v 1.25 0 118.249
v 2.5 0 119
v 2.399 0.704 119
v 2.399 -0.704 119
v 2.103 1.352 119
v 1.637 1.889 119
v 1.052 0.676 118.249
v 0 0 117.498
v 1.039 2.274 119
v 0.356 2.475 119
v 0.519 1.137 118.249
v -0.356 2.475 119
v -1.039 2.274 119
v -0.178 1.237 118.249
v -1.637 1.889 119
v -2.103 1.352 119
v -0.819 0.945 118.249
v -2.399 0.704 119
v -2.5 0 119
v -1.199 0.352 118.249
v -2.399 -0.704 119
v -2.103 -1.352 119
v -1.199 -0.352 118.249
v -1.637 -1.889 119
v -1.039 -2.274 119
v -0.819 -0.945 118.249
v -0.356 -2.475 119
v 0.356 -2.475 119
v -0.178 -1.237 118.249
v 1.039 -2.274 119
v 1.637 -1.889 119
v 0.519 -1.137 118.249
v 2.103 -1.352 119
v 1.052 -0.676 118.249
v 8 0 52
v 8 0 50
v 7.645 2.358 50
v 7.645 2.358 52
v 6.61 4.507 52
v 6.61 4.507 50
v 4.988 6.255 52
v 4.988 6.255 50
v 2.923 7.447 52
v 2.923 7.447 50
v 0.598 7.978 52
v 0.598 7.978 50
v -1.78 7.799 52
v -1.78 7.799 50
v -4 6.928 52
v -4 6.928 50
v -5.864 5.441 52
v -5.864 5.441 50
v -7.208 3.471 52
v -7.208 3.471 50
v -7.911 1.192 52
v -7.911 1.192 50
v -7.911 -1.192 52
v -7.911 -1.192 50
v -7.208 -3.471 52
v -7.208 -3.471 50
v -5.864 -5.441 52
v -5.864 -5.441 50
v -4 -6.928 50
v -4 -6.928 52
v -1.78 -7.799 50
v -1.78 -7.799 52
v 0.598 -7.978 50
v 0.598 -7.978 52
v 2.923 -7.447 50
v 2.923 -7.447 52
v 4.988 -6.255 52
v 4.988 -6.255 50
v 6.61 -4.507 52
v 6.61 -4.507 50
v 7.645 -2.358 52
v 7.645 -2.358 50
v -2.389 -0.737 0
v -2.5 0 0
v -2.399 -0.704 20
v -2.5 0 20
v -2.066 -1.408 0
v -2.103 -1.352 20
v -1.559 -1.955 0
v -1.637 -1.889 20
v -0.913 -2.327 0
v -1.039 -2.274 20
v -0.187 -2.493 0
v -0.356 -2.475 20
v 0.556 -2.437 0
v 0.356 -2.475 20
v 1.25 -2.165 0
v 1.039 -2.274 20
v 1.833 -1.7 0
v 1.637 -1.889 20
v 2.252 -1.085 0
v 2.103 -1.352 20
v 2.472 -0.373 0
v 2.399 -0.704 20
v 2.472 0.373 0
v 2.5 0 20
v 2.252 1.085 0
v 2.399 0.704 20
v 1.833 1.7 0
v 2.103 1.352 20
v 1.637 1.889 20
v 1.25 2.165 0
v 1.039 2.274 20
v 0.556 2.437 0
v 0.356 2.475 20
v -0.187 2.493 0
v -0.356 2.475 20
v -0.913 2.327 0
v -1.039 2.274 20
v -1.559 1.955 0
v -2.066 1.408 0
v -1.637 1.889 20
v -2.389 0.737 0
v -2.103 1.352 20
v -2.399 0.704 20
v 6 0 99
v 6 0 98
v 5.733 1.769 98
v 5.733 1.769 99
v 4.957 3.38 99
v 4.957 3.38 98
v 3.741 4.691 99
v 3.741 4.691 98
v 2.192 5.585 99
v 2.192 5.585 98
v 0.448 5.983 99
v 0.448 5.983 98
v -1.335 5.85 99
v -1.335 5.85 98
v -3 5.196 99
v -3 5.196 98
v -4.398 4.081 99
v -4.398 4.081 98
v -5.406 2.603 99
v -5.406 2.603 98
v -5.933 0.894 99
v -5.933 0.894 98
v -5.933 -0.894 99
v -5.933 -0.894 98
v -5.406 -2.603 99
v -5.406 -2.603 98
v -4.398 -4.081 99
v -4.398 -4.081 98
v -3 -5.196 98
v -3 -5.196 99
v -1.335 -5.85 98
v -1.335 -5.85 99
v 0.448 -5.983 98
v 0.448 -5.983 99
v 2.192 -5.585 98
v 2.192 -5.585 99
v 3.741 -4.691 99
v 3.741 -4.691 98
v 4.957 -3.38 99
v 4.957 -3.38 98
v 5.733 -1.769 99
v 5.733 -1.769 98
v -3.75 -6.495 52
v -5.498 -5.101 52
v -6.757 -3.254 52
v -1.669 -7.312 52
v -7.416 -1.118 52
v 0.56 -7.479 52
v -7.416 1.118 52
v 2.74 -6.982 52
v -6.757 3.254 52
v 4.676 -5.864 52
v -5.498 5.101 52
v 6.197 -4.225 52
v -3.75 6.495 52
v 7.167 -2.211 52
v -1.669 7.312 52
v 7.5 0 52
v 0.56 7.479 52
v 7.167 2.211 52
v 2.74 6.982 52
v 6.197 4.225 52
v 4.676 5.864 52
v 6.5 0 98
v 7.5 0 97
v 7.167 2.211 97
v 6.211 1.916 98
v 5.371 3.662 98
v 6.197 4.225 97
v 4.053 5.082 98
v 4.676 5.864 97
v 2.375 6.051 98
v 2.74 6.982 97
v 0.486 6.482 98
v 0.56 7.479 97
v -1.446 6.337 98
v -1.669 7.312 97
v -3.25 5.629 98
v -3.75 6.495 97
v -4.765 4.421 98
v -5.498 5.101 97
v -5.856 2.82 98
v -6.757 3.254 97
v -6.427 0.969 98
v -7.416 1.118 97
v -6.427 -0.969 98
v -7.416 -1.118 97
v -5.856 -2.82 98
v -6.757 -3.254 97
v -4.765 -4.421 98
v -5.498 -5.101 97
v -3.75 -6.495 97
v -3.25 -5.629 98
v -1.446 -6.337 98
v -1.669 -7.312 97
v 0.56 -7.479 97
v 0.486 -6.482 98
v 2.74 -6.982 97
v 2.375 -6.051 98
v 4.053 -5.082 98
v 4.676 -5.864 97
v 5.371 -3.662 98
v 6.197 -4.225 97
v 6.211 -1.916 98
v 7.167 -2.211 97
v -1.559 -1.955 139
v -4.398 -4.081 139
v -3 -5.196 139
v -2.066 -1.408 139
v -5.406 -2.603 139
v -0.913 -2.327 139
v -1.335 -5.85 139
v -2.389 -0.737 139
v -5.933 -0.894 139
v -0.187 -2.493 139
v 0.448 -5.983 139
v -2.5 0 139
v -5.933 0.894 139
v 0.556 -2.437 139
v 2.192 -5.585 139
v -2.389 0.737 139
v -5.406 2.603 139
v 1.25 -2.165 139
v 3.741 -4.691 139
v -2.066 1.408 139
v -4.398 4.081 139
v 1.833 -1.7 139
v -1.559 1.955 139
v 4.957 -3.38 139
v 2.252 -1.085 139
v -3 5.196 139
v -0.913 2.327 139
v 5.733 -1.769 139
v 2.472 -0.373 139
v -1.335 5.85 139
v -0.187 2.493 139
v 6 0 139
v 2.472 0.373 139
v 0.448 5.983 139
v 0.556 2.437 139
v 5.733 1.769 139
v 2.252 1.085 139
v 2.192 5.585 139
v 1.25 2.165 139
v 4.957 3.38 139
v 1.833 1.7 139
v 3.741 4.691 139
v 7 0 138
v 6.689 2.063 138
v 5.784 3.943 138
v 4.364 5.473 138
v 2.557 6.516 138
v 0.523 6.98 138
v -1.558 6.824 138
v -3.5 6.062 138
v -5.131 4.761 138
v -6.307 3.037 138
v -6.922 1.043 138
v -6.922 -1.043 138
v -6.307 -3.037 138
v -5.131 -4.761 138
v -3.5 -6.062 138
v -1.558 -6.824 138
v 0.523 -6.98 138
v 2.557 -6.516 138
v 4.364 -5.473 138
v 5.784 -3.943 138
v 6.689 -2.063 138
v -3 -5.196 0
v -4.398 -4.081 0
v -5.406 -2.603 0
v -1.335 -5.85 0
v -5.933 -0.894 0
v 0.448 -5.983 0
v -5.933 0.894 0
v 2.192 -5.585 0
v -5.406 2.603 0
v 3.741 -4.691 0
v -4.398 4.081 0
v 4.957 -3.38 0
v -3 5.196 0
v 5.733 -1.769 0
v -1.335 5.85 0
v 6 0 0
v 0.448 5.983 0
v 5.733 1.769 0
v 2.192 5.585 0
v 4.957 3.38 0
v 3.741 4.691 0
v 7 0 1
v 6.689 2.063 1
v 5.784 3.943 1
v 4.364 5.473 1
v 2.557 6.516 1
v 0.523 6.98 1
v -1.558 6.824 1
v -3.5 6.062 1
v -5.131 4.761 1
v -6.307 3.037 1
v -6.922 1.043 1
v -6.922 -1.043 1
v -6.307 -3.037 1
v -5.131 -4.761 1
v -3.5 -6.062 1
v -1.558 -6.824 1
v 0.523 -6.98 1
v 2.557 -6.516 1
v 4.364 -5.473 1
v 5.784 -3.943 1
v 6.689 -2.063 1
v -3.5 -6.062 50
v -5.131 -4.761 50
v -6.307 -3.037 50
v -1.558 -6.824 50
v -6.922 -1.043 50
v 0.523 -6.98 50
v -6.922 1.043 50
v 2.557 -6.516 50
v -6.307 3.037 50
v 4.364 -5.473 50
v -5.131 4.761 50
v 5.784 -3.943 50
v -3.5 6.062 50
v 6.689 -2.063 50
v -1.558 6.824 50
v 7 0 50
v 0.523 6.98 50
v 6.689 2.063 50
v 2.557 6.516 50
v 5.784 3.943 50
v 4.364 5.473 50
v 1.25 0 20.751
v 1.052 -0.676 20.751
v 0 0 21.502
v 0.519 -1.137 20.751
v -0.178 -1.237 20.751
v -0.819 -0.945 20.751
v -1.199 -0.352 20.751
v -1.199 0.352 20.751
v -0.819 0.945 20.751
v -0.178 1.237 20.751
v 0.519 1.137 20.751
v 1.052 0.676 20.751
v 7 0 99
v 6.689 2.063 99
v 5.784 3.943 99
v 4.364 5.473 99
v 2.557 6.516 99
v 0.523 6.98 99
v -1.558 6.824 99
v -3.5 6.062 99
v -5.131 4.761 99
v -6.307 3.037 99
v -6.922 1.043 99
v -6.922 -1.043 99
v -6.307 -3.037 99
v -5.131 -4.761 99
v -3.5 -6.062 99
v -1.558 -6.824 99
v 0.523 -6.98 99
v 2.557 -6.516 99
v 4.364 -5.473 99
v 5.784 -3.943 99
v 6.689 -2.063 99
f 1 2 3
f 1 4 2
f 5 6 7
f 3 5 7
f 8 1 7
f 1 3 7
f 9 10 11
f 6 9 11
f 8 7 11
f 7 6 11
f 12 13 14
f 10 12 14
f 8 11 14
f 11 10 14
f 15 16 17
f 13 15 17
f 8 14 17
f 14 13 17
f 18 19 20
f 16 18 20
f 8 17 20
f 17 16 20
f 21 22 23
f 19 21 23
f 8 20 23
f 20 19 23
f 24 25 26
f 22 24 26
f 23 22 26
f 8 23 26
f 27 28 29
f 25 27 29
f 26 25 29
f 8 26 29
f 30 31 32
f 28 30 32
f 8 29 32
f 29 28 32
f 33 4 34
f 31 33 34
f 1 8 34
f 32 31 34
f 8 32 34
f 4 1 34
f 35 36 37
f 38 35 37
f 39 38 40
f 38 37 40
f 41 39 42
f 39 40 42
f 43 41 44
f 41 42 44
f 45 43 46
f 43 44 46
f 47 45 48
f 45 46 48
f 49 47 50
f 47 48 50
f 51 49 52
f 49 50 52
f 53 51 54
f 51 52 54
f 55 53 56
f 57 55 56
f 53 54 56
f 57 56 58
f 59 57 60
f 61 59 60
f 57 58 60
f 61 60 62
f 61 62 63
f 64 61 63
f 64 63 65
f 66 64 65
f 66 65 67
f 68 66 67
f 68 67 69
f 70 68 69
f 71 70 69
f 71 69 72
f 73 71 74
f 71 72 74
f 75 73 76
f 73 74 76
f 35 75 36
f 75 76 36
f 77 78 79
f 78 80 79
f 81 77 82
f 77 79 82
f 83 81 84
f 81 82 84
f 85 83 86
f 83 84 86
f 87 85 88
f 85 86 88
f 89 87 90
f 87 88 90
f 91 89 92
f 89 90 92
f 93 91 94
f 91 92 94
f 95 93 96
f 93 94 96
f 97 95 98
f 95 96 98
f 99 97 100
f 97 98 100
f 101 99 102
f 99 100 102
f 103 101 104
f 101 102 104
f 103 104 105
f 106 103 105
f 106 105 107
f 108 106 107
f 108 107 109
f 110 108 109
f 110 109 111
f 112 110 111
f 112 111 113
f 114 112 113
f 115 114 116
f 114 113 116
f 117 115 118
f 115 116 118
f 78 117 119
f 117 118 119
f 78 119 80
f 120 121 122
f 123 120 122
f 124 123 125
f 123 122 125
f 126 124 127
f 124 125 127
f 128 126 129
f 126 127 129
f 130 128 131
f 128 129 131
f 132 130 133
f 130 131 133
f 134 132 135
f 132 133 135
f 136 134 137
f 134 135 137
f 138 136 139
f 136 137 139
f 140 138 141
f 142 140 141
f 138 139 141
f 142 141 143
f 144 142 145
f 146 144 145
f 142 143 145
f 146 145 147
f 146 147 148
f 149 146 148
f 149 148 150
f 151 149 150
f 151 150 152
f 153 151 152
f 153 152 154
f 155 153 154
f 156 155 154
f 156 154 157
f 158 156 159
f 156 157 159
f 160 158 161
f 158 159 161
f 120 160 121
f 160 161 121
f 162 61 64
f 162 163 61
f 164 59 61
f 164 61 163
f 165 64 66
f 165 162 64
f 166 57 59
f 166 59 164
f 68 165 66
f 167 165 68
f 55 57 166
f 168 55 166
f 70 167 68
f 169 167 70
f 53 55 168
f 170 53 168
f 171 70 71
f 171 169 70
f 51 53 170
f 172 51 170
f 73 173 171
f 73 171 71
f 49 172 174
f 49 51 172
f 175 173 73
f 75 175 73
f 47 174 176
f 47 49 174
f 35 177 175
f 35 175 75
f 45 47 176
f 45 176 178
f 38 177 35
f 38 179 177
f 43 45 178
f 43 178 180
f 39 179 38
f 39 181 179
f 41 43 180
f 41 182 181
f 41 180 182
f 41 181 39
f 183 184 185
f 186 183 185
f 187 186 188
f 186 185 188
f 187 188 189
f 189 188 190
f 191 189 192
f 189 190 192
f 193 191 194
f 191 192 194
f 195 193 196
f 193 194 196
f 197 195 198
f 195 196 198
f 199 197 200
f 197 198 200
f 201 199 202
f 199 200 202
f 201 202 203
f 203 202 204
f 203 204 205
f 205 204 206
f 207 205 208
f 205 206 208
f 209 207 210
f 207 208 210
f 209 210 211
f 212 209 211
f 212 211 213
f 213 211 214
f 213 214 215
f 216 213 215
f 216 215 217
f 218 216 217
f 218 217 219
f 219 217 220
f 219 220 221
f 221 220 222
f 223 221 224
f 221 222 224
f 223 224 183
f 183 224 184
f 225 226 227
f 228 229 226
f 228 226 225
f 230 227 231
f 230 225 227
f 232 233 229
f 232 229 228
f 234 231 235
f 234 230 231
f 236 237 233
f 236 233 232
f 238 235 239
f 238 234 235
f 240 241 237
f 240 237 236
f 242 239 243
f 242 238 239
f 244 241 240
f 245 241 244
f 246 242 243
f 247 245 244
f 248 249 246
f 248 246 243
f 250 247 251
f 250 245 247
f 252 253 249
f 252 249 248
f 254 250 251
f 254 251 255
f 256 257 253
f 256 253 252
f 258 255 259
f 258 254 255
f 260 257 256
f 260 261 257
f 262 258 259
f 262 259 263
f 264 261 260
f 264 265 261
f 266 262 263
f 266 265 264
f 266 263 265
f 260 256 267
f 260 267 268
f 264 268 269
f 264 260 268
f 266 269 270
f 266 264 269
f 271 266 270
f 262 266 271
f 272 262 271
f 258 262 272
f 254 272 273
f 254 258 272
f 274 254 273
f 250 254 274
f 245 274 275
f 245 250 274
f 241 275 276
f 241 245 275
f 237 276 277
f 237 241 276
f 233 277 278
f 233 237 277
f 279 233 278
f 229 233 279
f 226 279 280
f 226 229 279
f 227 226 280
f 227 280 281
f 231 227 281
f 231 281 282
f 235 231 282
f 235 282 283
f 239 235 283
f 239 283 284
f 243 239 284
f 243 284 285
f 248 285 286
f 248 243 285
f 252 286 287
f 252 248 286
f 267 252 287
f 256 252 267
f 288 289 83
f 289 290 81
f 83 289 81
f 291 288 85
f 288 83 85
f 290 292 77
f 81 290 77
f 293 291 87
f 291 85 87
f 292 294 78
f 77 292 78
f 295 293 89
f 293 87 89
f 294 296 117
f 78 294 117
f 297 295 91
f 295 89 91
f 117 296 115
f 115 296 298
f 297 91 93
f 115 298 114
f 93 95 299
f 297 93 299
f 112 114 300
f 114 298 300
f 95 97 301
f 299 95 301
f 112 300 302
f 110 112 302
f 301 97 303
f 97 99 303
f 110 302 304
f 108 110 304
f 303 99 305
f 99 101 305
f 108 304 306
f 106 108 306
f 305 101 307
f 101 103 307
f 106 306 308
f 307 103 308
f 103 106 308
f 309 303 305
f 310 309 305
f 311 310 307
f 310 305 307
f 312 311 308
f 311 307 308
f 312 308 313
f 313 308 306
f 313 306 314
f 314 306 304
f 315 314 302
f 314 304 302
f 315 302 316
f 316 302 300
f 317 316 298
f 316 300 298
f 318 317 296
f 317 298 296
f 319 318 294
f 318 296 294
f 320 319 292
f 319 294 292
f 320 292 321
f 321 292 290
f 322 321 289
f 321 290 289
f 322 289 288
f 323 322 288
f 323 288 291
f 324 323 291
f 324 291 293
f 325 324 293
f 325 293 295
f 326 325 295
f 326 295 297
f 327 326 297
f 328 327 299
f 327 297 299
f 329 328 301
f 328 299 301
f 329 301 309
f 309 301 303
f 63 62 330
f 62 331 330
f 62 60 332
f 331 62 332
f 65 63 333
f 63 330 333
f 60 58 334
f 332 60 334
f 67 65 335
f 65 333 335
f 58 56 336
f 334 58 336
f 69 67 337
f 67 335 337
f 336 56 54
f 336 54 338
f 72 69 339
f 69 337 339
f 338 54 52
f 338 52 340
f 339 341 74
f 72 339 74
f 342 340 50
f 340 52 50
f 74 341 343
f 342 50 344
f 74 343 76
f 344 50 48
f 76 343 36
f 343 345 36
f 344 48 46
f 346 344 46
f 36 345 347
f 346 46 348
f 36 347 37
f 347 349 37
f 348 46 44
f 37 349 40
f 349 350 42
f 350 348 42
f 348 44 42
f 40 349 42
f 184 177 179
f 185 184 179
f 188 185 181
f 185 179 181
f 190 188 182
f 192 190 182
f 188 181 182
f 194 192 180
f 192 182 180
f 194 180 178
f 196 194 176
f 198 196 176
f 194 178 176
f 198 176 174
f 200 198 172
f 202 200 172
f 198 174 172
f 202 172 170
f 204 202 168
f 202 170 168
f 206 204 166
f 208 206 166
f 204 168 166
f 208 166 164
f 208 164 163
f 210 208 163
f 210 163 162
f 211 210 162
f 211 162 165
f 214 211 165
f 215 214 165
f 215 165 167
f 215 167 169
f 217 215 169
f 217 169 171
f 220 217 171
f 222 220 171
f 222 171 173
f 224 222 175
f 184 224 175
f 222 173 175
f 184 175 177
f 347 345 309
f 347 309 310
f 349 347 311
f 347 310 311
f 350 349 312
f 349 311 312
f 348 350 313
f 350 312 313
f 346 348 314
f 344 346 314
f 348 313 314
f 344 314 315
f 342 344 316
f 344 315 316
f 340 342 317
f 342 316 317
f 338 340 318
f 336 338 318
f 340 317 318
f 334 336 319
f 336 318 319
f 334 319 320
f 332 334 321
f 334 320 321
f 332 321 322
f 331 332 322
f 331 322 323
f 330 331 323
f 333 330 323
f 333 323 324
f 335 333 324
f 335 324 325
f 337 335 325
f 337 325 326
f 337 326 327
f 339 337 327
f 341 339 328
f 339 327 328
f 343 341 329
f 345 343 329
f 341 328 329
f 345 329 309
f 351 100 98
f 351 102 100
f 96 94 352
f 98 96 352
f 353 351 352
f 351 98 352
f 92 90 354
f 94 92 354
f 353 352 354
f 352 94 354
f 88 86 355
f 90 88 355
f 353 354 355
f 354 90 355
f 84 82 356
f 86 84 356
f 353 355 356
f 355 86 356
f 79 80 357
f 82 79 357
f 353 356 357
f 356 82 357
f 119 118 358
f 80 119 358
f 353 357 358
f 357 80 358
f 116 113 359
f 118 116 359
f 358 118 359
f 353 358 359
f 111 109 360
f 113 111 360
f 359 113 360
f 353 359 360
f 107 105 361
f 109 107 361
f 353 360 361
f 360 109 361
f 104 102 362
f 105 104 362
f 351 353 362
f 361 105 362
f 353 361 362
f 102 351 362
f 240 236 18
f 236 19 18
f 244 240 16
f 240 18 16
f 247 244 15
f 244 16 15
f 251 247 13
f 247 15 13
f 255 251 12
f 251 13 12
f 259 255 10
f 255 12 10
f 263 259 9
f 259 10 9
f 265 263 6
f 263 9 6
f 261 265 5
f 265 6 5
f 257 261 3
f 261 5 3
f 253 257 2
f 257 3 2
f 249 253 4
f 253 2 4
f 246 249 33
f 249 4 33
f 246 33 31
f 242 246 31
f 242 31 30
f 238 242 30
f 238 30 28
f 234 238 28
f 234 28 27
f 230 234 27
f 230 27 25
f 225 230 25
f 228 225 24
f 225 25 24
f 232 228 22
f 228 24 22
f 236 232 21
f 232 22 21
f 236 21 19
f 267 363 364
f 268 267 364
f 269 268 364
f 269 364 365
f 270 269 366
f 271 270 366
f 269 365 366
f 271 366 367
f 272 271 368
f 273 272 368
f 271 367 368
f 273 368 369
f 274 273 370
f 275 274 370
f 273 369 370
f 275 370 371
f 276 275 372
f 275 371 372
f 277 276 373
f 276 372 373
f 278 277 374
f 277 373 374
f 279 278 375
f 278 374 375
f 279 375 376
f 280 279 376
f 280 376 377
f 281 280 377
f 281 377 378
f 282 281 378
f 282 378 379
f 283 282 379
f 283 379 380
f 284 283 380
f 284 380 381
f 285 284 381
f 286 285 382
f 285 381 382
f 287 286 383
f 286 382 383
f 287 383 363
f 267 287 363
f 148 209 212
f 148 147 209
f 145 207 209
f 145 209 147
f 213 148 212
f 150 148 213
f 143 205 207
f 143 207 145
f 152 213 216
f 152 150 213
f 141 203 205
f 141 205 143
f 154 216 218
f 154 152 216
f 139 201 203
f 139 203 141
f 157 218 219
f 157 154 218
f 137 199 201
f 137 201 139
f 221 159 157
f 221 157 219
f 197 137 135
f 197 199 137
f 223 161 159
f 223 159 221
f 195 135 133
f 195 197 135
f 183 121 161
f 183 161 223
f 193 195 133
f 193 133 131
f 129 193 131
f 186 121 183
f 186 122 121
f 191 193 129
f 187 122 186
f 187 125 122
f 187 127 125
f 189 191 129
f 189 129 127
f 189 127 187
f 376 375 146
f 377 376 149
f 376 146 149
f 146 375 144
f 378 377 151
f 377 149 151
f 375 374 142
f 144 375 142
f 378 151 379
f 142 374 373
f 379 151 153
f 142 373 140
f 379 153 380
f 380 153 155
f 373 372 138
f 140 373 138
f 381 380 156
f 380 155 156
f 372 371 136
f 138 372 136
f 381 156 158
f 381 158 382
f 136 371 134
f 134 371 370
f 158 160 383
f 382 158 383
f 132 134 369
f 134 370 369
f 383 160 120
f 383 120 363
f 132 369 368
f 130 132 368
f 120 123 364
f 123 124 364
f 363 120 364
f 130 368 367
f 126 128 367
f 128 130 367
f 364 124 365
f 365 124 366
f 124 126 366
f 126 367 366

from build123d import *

# Parameters (mm, degrees)
F0_R      = 7
F1_DEPTH  = 50
F2_R      = 8
F3_DEPTH  = 2
F4_R      = 7.5
F5_DEPTH  = 46
F6_R      = 6
F7_DEPTH  = 1
F8_R      = 7
F9_DEPTH  = 40
F11_D     = 5
F11_DEPTH = 20
F11_TIP   = 1.5021515476
F13_D     = 5
F13_DEPTH = 20
F13_TIP   = 1.5021515476
F14_SIZE  = 1


with BuildPart() as f1:
    # F0 (on Top) → F1 (new body)
    with BuildSketch(Plane.XY):
        Circle(F0_R)
    extrude(amount=F1_DEPTH)

    # F2 (on face) → F3 (join)
    with BuildSketch(Plane.XY.offset(50)):
        Circle(F2_R)
    extrude(amount=F3_DEPTH)

    # F4 (on face) → F5 (join)
    with BuildSketch(Plane.XY.offset(52)):
        Circle(F4_R)
    extrude(amount=F5_DEPTH)

    # F6 (on face) → F7 (join)
    with BuildSketch(Plane.XY.offset(98)):
        Circle(F6_R)
    extrude(amount=F7_DEPTH)

    # F8 (on face) → F9 (join)
    with BuildSketch(Plane.XY.offset(99)):
        Circle(F8_R)
    extrude(amount=F9_DEPTH)

    # F11
    with Locations(Plane.XY.offset(139)):
        with Locations((0, 0)):
            Hole(F11_D / 2, depth=F11_DEPTH)
            with Locations((0, 0, -(F11_DEPTH + F11_TIP / 2))):  # 118° drill point
                Cone(0, F11_D / 2, F11_TIP, mode=Mode.SUBTRACT)

    # F13
    with Locations(Plane(origin=(0, 0, 0), x_dir=(1, 0, 0), z_dir=(0, 0, -1))):
        with Locations((0, 0)):
            Hole(F13_D / 2, depth=F13_DEPTH)
            with Locations((0, 0, -(F13_DEPTH + F13_TIP / 2))):  # 118° drill point
                Cone(0, F13_D / 2, F13_TIP, mode=Mode.SUBTRACT)

    # F14
    f14_edges = [f1.edges().sort_by_distance(p)[0] for p in [
        (-7, 0, 0),
        (-7, 0, 139),
        (-7.5, 0, 98),
    ]]
    chamfer(f14_edges, length=F14_SIZE)


solid = f1.part
